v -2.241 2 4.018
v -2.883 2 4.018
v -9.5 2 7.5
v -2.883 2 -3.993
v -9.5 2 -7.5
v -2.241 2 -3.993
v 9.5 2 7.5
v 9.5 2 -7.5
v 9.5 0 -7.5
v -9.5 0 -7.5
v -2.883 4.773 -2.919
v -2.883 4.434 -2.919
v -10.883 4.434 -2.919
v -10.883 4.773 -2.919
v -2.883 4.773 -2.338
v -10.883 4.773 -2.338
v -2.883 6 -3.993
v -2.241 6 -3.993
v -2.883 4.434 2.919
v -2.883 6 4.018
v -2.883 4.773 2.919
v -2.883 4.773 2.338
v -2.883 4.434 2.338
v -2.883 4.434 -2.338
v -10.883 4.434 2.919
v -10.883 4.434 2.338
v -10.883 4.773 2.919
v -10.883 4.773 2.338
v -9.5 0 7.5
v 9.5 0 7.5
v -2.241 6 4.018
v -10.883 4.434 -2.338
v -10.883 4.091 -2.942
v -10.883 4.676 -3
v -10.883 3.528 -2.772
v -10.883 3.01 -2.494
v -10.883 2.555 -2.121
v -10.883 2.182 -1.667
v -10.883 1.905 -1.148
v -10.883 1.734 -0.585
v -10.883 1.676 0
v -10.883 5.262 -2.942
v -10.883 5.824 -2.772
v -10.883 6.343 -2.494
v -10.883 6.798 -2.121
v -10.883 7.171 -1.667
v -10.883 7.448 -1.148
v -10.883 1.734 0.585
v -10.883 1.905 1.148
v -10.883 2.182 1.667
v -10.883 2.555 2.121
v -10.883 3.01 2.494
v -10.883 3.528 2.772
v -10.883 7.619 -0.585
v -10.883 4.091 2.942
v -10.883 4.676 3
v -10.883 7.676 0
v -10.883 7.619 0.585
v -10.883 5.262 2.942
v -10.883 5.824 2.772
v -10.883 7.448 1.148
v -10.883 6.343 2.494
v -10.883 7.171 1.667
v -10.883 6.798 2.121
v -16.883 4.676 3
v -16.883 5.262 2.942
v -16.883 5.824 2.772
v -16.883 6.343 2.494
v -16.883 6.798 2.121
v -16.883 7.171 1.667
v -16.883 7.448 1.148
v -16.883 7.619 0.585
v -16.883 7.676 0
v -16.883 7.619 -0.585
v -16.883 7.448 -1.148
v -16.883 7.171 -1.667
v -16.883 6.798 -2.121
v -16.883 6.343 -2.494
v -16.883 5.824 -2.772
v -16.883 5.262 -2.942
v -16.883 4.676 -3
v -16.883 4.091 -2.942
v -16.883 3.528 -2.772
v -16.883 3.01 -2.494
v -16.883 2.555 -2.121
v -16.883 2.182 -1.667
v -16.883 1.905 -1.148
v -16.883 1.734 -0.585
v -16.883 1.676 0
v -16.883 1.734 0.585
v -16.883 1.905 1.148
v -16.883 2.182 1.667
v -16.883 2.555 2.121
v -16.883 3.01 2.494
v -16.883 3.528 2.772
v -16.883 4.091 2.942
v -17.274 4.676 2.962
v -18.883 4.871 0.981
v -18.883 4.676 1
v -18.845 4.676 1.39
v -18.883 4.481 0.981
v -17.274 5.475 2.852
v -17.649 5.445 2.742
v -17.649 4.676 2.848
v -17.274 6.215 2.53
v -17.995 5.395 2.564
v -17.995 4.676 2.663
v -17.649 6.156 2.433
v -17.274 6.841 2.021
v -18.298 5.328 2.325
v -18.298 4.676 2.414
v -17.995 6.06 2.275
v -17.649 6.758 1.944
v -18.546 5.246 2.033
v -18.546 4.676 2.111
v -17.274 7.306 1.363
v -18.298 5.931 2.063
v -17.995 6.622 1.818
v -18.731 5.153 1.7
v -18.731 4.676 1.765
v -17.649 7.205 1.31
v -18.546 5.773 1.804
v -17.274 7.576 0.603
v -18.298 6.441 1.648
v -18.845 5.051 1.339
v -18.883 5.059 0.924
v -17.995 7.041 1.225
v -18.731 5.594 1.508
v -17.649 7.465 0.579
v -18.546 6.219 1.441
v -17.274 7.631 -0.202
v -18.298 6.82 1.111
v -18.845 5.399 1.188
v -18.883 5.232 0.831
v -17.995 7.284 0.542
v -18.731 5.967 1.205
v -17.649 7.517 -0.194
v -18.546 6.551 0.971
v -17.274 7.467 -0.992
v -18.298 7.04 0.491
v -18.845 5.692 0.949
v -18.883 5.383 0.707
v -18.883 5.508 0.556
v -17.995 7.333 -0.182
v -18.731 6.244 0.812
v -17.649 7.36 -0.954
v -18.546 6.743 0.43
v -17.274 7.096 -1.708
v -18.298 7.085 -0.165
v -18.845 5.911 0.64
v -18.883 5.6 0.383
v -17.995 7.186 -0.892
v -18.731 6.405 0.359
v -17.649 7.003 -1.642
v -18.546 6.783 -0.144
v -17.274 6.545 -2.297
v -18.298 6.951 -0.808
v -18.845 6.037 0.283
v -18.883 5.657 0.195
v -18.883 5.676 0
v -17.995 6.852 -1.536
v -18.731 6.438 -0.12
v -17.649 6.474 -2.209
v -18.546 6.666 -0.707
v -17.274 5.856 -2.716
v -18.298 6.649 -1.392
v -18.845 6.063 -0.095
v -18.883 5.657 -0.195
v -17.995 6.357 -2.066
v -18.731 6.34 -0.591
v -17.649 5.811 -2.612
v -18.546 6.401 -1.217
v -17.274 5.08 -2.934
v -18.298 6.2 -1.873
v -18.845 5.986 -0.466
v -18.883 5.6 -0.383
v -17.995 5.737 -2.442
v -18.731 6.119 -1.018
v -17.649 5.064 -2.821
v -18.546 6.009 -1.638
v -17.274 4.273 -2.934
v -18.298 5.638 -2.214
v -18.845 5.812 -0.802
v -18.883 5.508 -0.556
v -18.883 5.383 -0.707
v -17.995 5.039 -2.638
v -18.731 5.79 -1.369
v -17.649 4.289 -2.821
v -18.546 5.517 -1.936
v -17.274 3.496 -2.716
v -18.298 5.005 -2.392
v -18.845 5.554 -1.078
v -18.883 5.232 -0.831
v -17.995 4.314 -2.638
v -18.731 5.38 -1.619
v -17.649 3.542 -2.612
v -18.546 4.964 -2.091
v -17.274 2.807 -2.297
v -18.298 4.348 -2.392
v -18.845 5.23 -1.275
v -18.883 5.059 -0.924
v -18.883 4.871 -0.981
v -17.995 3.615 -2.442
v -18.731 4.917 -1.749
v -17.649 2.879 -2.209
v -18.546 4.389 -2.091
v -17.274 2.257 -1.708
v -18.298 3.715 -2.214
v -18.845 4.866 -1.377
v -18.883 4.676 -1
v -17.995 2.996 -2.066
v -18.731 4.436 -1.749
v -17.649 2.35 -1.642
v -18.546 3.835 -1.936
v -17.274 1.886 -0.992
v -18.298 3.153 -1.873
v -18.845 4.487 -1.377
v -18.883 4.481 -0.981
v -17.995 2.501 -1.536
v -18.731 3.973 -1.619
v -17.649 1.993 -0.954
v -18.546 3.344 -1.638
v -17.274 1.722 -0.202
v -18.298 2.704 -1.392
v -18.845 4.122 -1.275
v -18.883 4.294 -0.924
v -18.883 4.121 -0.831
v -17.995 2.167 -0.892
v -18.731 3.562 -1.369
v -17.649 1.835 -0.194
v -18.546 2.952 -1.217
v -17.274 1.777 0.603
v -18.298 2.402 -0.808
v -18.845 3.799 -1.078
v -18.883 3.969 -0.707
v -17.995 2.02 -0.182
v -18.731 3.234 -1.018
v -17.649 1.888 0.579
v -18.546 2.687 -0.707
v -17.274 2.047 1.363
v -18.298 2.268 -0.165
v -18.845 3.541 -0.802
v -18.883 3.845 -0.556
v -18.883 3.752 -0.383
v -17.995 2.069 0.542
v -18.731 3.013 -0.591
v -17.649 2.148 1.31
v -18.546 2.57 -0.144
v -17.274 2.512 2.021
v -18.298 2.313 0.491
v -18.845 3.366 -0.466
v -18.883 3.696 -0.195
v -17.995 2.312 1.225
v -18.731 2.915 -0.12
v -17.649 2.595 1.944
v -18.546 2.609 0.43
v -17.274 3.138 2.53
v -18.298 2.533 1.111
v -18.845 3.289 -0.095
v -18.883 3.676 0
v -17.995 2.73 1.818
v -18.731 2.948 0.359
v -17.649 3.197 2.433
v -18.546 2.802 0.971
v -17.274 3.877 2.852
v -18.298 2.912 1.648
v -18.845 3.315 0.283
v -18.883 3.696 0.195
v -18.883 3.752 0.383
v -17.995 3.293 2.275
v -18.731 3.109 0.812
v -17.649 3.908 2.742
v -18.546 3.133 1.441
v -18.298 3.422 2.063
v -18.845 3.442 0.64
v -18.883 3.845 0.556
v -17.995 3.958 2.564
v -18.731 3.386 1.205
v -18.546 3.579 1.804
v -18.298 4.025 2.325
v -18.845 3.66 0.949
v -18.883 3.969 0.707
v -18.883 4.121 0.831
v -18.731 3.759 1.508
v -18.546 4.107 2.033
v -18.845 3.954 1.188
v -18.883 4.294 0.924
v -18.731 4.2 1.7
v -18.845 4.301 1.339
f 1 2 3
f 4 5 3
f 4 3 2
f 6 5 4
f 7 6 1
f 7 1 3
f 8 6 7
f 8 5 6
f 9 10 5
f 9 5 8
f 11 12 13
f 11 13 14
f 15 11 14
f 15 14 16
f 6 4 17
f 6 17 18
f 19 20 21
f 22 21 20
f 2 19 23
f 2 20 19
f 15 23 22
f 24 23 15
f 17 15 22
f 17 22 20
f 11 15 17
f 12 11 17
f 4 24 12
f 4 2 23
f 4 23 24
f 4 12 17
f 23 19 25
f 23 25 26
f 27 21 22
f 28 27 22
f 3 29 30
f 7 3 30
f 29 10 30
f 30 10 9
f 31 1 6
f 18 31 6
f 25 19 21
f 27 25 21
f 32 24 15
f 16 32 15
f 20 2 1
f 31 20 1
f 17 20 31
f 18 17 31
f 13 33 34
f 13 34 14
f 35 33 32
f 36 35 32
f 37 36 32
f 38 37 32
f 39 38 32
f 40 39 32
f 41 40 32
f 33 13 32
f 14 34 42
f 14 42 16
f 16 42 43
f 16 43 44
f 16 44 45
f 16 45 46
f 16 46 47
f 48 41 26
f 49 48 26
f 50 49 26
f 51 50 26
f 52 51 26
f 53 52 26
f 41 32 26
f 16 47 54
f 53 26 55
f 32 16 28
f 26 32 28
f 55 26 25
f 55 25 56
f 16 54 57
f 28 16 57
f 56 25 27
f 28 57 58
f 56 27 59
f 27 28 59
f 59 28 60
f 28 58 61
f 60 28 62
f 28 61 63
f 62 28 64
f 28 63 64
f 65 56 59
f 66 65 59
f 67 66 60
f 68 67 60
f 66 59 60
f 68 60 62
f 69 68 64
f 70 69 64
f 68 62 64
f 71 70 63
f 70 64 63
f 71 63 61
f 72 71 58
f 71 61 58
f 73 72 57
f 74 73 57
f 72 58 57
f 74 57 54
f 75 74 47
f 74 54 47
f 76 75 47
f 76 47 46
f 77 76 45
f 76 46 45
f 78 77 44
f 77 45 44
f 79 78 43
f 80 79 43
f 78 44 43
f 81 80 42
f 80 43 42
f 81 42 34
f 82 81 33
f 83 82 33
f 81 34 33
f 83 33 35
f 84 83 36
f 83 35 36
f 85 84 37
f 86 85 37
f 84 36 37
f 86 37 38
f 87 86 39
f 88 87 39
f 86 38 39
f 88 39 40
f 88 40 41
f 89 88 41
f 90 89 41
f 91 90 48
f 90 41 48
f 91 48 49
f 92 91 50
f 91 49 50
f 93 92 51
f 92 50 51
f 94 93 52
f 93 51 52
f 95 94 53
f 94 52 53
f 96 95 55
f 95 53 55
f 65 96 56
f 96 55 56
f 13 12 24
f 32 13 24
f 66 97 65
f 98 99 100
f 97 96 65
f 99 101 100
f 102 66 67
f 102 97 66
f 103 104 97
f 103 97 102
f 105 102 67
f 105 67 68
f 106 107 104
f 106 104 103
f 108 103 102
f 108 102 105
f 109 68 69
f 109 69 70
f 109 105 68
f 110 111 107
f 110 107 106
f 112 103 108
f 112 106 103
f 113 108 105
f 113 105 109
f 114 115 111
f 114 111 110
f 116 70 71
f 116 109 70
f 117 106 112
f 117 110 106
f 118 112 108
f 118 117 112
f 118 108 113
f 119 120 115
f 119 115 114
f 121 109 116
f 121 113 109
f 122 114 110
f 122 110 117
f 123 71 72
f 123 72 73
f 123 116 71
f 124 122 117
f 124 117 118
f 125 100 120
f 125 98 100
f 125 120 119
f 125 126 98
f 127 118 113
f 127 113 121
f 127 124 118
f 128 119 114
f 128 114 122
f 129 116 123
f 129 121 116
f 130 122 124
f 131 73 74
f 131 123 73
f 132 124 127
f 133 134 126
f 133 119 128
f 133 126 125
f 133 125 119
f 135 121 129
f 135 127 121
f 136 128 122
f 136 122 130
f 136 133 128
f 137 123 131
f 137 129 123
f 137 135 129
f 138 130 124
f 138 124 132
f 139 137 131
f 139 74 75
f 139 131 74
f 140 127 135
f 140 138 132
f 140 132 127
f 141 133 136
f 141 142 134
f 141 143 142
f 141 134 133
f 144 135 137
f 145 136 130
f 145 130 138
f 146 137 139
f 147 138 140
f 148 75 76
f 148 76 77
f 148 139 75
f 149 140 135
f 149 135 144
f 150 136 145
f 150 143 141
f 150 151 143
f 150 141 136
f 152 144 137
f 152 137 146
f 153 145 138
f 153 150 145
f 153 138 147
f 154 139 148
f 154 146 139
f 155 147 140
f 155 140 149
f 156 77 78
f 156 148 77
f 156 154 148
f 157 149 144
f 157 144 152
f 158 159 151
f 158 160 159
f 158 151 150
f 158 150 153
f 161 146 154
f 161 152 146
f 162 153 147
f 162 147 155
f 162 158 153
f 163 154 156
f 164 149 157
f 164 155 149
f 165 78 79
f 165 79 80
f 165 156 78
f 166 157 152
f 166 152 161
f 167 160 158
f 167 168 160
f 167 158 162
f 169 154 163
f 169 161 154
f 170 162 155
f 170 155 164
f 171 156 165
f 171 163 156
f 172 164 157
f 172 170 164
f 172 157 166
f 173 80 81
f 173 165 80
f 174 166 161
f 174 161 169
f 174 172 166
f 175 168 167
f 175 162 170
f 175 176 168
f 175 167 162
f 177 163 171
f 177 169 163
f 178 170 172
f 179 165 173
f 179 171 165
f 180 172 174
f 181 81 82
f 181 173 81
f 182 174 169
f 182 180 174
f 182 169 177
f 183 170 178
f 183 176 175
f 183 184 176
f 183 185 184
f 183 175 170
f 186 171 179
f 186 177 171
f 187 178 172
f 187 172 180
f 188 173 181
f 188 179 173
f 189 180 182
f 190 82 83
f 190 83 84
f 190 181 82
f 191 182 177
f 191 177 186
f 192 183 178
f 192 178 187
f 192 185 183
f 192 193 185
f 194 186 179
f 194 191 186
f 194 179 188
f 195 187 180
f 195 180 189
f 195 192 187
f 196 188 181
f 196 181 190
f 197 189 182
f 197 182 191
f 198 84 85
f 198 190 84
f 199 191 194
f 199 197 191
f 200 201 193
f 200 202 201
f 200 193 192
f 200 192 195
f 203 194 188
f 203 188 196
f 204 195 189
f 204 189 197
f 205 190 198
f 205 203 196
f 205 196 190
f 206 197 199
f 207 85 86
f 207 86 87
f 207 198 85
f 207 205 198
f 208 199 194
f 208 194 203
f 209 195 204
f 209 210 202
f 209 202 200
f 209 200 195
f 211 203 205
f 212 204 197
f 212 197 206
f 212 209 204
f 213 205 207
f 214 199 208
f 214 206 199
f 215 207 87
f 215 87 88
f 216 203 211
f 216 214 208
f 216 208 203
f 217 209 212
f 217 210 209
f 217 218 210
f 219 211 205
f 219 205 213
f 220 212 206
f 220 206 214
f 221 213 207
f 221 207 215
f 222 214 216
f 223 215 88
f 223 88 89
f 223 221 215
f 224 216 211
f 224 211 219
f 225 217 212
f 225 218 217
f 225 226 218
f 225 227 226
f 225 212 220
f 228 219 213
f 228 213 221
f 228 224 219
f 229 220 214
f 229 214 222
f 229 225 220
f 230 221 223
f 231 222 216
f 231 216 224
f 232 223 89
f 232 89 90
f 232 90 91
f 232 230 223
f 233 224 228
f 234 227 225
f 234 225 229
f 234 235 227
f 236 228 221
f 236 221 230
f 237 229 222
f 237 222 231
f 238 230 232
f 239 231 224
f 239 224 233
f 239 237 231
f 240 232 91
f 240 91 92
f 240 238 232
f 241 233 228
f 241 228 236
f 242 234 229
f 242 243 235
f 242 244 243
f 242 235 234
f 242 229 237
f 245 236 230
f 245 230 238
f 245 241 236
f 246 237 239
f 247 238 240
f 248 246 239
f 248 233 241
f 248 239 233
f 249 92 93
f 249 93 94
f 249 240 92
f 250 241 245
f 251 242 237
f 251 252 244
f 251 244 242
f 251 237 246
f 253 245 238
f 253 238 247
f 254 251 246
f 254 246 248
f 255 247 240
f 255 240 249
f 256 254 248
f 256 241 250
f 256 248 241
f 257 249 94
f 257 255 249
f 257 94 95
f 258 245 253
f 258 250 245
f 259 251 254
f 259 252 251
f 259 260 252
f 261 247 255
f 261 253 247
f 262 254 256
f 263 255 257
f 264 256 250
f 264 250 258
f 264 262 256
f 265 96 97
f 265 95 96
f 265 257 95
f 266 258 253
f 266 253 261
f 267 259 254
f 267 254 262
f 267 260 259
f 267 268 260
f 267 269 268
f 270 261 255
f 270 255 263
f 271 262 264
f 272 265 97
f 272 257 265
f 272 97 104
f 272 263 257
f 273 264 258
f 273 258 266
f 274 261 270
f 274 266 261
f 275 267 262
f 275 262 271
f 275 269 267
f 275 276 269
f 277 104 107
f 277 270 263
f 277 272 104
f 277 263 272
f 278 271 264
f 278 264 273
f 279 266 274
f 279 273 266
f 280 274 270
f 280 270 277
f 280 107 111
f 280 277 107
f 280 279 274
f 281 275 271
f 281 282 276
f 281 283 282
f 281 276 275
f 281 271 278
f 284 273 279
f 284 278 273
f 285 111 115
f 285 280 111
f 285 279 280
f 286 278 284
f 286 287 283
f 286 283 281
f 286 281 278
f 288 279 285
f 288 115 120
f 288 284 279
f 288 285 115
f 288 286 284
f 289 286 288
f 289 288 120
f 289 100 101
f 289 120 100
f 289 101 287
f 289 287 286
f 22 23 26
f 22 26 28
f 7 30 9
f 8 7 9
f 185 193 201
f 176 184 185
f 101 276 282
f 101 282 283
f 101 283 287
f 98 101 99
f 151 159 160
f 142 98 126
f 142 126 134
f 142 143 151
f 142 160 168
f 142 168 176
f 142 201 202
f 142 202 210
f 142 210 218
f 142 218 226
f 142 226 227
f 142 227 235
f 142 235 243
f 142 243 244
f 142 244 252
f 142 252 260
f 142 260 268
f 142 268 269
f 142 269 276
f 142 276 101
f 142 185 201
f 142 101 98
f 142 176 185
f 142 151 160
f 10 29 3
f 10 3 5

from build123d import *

# Parameters (mm, degrees)
ESQUISSE1_W        = 19
ESQUISSE1_H        = 15
BOSS_EXTRU_1_DEPTH = 2
ESQUISSE2_W        = 0.642500129
ESQUISSE2_H        = 8.011173479
BOSS_EXTRU_2_DEPTH = 4
ESQUISSE3_W        = 0.58049635
ESQUISSE3_H        = 0.338622871
BOSS_EXTRU_3_DEPTH = 8
ESQUISSE4_R        = 3
BOSS_EXTRU_4_DEPTH = 8
CONG_1_R           = 2


with BuildPart() as part:
    # Esquisse1 → Boss.-Extru.1 (new body)
    with BuildSketch(Plane(origin=(0, 0, 0), x_dir=(1, 0, 0), z_dir=(0, 1, 0))):
        Rectangle(ESQUISSE1_W, ESQUISSE1_H)
    extrude(amount=BOSS_EXTRU_1_DEPTH)

    # Esquisse2 → Boss.-Extru.2 (add)
    with BuildSketch(Plane(origin=(0, 2, 0), x_dir=(1, 0, 0), z_dir=(0, 1, 0))):
        with Locations((-2.562175711, -0.012775057)):
            Rectangle(ESQUISSE2_W, ESQUISSE2_H)
    extrude(amount=BOSS_EXTRU_2_DEPTH)

    # Esquisse3 → Boss.-Extru.3 (add)
    with BuildSketch(Plane.ZY.offset(2.883425775)):
        with Locations((-2.628358474, 4.603596233)):
            Rectangle(ESQUISSE3_W, ESQUISSE3_H)
    boss_extru_3 = extrude(amount=BOSS_EXTRU_3_DEPTH)

    # Symétrie1: Boss.-Extru.3 across plane
    add(boss_extru_3.mirror(Plane.XY))

    # Esquisse4 → Boss.-Extru.4 (add)
    with BuildSketch(Plane.ZY.offset(10.883425775)):
        with Locations((0, 4.67632737)):
            Circle(ESQUISSE4_R)
    extrude(amount=BOSS_EXTRU_4_DEPTH)

    # Congé1
    cong_1_edges = [part.edges().sort_by_distance(p)[0] for p in [
        (-18.883425775, 4.67632737, -3),
    ]]
    fillet(cong_1_edges, radius=CONG_1_R)


solid = part.part
